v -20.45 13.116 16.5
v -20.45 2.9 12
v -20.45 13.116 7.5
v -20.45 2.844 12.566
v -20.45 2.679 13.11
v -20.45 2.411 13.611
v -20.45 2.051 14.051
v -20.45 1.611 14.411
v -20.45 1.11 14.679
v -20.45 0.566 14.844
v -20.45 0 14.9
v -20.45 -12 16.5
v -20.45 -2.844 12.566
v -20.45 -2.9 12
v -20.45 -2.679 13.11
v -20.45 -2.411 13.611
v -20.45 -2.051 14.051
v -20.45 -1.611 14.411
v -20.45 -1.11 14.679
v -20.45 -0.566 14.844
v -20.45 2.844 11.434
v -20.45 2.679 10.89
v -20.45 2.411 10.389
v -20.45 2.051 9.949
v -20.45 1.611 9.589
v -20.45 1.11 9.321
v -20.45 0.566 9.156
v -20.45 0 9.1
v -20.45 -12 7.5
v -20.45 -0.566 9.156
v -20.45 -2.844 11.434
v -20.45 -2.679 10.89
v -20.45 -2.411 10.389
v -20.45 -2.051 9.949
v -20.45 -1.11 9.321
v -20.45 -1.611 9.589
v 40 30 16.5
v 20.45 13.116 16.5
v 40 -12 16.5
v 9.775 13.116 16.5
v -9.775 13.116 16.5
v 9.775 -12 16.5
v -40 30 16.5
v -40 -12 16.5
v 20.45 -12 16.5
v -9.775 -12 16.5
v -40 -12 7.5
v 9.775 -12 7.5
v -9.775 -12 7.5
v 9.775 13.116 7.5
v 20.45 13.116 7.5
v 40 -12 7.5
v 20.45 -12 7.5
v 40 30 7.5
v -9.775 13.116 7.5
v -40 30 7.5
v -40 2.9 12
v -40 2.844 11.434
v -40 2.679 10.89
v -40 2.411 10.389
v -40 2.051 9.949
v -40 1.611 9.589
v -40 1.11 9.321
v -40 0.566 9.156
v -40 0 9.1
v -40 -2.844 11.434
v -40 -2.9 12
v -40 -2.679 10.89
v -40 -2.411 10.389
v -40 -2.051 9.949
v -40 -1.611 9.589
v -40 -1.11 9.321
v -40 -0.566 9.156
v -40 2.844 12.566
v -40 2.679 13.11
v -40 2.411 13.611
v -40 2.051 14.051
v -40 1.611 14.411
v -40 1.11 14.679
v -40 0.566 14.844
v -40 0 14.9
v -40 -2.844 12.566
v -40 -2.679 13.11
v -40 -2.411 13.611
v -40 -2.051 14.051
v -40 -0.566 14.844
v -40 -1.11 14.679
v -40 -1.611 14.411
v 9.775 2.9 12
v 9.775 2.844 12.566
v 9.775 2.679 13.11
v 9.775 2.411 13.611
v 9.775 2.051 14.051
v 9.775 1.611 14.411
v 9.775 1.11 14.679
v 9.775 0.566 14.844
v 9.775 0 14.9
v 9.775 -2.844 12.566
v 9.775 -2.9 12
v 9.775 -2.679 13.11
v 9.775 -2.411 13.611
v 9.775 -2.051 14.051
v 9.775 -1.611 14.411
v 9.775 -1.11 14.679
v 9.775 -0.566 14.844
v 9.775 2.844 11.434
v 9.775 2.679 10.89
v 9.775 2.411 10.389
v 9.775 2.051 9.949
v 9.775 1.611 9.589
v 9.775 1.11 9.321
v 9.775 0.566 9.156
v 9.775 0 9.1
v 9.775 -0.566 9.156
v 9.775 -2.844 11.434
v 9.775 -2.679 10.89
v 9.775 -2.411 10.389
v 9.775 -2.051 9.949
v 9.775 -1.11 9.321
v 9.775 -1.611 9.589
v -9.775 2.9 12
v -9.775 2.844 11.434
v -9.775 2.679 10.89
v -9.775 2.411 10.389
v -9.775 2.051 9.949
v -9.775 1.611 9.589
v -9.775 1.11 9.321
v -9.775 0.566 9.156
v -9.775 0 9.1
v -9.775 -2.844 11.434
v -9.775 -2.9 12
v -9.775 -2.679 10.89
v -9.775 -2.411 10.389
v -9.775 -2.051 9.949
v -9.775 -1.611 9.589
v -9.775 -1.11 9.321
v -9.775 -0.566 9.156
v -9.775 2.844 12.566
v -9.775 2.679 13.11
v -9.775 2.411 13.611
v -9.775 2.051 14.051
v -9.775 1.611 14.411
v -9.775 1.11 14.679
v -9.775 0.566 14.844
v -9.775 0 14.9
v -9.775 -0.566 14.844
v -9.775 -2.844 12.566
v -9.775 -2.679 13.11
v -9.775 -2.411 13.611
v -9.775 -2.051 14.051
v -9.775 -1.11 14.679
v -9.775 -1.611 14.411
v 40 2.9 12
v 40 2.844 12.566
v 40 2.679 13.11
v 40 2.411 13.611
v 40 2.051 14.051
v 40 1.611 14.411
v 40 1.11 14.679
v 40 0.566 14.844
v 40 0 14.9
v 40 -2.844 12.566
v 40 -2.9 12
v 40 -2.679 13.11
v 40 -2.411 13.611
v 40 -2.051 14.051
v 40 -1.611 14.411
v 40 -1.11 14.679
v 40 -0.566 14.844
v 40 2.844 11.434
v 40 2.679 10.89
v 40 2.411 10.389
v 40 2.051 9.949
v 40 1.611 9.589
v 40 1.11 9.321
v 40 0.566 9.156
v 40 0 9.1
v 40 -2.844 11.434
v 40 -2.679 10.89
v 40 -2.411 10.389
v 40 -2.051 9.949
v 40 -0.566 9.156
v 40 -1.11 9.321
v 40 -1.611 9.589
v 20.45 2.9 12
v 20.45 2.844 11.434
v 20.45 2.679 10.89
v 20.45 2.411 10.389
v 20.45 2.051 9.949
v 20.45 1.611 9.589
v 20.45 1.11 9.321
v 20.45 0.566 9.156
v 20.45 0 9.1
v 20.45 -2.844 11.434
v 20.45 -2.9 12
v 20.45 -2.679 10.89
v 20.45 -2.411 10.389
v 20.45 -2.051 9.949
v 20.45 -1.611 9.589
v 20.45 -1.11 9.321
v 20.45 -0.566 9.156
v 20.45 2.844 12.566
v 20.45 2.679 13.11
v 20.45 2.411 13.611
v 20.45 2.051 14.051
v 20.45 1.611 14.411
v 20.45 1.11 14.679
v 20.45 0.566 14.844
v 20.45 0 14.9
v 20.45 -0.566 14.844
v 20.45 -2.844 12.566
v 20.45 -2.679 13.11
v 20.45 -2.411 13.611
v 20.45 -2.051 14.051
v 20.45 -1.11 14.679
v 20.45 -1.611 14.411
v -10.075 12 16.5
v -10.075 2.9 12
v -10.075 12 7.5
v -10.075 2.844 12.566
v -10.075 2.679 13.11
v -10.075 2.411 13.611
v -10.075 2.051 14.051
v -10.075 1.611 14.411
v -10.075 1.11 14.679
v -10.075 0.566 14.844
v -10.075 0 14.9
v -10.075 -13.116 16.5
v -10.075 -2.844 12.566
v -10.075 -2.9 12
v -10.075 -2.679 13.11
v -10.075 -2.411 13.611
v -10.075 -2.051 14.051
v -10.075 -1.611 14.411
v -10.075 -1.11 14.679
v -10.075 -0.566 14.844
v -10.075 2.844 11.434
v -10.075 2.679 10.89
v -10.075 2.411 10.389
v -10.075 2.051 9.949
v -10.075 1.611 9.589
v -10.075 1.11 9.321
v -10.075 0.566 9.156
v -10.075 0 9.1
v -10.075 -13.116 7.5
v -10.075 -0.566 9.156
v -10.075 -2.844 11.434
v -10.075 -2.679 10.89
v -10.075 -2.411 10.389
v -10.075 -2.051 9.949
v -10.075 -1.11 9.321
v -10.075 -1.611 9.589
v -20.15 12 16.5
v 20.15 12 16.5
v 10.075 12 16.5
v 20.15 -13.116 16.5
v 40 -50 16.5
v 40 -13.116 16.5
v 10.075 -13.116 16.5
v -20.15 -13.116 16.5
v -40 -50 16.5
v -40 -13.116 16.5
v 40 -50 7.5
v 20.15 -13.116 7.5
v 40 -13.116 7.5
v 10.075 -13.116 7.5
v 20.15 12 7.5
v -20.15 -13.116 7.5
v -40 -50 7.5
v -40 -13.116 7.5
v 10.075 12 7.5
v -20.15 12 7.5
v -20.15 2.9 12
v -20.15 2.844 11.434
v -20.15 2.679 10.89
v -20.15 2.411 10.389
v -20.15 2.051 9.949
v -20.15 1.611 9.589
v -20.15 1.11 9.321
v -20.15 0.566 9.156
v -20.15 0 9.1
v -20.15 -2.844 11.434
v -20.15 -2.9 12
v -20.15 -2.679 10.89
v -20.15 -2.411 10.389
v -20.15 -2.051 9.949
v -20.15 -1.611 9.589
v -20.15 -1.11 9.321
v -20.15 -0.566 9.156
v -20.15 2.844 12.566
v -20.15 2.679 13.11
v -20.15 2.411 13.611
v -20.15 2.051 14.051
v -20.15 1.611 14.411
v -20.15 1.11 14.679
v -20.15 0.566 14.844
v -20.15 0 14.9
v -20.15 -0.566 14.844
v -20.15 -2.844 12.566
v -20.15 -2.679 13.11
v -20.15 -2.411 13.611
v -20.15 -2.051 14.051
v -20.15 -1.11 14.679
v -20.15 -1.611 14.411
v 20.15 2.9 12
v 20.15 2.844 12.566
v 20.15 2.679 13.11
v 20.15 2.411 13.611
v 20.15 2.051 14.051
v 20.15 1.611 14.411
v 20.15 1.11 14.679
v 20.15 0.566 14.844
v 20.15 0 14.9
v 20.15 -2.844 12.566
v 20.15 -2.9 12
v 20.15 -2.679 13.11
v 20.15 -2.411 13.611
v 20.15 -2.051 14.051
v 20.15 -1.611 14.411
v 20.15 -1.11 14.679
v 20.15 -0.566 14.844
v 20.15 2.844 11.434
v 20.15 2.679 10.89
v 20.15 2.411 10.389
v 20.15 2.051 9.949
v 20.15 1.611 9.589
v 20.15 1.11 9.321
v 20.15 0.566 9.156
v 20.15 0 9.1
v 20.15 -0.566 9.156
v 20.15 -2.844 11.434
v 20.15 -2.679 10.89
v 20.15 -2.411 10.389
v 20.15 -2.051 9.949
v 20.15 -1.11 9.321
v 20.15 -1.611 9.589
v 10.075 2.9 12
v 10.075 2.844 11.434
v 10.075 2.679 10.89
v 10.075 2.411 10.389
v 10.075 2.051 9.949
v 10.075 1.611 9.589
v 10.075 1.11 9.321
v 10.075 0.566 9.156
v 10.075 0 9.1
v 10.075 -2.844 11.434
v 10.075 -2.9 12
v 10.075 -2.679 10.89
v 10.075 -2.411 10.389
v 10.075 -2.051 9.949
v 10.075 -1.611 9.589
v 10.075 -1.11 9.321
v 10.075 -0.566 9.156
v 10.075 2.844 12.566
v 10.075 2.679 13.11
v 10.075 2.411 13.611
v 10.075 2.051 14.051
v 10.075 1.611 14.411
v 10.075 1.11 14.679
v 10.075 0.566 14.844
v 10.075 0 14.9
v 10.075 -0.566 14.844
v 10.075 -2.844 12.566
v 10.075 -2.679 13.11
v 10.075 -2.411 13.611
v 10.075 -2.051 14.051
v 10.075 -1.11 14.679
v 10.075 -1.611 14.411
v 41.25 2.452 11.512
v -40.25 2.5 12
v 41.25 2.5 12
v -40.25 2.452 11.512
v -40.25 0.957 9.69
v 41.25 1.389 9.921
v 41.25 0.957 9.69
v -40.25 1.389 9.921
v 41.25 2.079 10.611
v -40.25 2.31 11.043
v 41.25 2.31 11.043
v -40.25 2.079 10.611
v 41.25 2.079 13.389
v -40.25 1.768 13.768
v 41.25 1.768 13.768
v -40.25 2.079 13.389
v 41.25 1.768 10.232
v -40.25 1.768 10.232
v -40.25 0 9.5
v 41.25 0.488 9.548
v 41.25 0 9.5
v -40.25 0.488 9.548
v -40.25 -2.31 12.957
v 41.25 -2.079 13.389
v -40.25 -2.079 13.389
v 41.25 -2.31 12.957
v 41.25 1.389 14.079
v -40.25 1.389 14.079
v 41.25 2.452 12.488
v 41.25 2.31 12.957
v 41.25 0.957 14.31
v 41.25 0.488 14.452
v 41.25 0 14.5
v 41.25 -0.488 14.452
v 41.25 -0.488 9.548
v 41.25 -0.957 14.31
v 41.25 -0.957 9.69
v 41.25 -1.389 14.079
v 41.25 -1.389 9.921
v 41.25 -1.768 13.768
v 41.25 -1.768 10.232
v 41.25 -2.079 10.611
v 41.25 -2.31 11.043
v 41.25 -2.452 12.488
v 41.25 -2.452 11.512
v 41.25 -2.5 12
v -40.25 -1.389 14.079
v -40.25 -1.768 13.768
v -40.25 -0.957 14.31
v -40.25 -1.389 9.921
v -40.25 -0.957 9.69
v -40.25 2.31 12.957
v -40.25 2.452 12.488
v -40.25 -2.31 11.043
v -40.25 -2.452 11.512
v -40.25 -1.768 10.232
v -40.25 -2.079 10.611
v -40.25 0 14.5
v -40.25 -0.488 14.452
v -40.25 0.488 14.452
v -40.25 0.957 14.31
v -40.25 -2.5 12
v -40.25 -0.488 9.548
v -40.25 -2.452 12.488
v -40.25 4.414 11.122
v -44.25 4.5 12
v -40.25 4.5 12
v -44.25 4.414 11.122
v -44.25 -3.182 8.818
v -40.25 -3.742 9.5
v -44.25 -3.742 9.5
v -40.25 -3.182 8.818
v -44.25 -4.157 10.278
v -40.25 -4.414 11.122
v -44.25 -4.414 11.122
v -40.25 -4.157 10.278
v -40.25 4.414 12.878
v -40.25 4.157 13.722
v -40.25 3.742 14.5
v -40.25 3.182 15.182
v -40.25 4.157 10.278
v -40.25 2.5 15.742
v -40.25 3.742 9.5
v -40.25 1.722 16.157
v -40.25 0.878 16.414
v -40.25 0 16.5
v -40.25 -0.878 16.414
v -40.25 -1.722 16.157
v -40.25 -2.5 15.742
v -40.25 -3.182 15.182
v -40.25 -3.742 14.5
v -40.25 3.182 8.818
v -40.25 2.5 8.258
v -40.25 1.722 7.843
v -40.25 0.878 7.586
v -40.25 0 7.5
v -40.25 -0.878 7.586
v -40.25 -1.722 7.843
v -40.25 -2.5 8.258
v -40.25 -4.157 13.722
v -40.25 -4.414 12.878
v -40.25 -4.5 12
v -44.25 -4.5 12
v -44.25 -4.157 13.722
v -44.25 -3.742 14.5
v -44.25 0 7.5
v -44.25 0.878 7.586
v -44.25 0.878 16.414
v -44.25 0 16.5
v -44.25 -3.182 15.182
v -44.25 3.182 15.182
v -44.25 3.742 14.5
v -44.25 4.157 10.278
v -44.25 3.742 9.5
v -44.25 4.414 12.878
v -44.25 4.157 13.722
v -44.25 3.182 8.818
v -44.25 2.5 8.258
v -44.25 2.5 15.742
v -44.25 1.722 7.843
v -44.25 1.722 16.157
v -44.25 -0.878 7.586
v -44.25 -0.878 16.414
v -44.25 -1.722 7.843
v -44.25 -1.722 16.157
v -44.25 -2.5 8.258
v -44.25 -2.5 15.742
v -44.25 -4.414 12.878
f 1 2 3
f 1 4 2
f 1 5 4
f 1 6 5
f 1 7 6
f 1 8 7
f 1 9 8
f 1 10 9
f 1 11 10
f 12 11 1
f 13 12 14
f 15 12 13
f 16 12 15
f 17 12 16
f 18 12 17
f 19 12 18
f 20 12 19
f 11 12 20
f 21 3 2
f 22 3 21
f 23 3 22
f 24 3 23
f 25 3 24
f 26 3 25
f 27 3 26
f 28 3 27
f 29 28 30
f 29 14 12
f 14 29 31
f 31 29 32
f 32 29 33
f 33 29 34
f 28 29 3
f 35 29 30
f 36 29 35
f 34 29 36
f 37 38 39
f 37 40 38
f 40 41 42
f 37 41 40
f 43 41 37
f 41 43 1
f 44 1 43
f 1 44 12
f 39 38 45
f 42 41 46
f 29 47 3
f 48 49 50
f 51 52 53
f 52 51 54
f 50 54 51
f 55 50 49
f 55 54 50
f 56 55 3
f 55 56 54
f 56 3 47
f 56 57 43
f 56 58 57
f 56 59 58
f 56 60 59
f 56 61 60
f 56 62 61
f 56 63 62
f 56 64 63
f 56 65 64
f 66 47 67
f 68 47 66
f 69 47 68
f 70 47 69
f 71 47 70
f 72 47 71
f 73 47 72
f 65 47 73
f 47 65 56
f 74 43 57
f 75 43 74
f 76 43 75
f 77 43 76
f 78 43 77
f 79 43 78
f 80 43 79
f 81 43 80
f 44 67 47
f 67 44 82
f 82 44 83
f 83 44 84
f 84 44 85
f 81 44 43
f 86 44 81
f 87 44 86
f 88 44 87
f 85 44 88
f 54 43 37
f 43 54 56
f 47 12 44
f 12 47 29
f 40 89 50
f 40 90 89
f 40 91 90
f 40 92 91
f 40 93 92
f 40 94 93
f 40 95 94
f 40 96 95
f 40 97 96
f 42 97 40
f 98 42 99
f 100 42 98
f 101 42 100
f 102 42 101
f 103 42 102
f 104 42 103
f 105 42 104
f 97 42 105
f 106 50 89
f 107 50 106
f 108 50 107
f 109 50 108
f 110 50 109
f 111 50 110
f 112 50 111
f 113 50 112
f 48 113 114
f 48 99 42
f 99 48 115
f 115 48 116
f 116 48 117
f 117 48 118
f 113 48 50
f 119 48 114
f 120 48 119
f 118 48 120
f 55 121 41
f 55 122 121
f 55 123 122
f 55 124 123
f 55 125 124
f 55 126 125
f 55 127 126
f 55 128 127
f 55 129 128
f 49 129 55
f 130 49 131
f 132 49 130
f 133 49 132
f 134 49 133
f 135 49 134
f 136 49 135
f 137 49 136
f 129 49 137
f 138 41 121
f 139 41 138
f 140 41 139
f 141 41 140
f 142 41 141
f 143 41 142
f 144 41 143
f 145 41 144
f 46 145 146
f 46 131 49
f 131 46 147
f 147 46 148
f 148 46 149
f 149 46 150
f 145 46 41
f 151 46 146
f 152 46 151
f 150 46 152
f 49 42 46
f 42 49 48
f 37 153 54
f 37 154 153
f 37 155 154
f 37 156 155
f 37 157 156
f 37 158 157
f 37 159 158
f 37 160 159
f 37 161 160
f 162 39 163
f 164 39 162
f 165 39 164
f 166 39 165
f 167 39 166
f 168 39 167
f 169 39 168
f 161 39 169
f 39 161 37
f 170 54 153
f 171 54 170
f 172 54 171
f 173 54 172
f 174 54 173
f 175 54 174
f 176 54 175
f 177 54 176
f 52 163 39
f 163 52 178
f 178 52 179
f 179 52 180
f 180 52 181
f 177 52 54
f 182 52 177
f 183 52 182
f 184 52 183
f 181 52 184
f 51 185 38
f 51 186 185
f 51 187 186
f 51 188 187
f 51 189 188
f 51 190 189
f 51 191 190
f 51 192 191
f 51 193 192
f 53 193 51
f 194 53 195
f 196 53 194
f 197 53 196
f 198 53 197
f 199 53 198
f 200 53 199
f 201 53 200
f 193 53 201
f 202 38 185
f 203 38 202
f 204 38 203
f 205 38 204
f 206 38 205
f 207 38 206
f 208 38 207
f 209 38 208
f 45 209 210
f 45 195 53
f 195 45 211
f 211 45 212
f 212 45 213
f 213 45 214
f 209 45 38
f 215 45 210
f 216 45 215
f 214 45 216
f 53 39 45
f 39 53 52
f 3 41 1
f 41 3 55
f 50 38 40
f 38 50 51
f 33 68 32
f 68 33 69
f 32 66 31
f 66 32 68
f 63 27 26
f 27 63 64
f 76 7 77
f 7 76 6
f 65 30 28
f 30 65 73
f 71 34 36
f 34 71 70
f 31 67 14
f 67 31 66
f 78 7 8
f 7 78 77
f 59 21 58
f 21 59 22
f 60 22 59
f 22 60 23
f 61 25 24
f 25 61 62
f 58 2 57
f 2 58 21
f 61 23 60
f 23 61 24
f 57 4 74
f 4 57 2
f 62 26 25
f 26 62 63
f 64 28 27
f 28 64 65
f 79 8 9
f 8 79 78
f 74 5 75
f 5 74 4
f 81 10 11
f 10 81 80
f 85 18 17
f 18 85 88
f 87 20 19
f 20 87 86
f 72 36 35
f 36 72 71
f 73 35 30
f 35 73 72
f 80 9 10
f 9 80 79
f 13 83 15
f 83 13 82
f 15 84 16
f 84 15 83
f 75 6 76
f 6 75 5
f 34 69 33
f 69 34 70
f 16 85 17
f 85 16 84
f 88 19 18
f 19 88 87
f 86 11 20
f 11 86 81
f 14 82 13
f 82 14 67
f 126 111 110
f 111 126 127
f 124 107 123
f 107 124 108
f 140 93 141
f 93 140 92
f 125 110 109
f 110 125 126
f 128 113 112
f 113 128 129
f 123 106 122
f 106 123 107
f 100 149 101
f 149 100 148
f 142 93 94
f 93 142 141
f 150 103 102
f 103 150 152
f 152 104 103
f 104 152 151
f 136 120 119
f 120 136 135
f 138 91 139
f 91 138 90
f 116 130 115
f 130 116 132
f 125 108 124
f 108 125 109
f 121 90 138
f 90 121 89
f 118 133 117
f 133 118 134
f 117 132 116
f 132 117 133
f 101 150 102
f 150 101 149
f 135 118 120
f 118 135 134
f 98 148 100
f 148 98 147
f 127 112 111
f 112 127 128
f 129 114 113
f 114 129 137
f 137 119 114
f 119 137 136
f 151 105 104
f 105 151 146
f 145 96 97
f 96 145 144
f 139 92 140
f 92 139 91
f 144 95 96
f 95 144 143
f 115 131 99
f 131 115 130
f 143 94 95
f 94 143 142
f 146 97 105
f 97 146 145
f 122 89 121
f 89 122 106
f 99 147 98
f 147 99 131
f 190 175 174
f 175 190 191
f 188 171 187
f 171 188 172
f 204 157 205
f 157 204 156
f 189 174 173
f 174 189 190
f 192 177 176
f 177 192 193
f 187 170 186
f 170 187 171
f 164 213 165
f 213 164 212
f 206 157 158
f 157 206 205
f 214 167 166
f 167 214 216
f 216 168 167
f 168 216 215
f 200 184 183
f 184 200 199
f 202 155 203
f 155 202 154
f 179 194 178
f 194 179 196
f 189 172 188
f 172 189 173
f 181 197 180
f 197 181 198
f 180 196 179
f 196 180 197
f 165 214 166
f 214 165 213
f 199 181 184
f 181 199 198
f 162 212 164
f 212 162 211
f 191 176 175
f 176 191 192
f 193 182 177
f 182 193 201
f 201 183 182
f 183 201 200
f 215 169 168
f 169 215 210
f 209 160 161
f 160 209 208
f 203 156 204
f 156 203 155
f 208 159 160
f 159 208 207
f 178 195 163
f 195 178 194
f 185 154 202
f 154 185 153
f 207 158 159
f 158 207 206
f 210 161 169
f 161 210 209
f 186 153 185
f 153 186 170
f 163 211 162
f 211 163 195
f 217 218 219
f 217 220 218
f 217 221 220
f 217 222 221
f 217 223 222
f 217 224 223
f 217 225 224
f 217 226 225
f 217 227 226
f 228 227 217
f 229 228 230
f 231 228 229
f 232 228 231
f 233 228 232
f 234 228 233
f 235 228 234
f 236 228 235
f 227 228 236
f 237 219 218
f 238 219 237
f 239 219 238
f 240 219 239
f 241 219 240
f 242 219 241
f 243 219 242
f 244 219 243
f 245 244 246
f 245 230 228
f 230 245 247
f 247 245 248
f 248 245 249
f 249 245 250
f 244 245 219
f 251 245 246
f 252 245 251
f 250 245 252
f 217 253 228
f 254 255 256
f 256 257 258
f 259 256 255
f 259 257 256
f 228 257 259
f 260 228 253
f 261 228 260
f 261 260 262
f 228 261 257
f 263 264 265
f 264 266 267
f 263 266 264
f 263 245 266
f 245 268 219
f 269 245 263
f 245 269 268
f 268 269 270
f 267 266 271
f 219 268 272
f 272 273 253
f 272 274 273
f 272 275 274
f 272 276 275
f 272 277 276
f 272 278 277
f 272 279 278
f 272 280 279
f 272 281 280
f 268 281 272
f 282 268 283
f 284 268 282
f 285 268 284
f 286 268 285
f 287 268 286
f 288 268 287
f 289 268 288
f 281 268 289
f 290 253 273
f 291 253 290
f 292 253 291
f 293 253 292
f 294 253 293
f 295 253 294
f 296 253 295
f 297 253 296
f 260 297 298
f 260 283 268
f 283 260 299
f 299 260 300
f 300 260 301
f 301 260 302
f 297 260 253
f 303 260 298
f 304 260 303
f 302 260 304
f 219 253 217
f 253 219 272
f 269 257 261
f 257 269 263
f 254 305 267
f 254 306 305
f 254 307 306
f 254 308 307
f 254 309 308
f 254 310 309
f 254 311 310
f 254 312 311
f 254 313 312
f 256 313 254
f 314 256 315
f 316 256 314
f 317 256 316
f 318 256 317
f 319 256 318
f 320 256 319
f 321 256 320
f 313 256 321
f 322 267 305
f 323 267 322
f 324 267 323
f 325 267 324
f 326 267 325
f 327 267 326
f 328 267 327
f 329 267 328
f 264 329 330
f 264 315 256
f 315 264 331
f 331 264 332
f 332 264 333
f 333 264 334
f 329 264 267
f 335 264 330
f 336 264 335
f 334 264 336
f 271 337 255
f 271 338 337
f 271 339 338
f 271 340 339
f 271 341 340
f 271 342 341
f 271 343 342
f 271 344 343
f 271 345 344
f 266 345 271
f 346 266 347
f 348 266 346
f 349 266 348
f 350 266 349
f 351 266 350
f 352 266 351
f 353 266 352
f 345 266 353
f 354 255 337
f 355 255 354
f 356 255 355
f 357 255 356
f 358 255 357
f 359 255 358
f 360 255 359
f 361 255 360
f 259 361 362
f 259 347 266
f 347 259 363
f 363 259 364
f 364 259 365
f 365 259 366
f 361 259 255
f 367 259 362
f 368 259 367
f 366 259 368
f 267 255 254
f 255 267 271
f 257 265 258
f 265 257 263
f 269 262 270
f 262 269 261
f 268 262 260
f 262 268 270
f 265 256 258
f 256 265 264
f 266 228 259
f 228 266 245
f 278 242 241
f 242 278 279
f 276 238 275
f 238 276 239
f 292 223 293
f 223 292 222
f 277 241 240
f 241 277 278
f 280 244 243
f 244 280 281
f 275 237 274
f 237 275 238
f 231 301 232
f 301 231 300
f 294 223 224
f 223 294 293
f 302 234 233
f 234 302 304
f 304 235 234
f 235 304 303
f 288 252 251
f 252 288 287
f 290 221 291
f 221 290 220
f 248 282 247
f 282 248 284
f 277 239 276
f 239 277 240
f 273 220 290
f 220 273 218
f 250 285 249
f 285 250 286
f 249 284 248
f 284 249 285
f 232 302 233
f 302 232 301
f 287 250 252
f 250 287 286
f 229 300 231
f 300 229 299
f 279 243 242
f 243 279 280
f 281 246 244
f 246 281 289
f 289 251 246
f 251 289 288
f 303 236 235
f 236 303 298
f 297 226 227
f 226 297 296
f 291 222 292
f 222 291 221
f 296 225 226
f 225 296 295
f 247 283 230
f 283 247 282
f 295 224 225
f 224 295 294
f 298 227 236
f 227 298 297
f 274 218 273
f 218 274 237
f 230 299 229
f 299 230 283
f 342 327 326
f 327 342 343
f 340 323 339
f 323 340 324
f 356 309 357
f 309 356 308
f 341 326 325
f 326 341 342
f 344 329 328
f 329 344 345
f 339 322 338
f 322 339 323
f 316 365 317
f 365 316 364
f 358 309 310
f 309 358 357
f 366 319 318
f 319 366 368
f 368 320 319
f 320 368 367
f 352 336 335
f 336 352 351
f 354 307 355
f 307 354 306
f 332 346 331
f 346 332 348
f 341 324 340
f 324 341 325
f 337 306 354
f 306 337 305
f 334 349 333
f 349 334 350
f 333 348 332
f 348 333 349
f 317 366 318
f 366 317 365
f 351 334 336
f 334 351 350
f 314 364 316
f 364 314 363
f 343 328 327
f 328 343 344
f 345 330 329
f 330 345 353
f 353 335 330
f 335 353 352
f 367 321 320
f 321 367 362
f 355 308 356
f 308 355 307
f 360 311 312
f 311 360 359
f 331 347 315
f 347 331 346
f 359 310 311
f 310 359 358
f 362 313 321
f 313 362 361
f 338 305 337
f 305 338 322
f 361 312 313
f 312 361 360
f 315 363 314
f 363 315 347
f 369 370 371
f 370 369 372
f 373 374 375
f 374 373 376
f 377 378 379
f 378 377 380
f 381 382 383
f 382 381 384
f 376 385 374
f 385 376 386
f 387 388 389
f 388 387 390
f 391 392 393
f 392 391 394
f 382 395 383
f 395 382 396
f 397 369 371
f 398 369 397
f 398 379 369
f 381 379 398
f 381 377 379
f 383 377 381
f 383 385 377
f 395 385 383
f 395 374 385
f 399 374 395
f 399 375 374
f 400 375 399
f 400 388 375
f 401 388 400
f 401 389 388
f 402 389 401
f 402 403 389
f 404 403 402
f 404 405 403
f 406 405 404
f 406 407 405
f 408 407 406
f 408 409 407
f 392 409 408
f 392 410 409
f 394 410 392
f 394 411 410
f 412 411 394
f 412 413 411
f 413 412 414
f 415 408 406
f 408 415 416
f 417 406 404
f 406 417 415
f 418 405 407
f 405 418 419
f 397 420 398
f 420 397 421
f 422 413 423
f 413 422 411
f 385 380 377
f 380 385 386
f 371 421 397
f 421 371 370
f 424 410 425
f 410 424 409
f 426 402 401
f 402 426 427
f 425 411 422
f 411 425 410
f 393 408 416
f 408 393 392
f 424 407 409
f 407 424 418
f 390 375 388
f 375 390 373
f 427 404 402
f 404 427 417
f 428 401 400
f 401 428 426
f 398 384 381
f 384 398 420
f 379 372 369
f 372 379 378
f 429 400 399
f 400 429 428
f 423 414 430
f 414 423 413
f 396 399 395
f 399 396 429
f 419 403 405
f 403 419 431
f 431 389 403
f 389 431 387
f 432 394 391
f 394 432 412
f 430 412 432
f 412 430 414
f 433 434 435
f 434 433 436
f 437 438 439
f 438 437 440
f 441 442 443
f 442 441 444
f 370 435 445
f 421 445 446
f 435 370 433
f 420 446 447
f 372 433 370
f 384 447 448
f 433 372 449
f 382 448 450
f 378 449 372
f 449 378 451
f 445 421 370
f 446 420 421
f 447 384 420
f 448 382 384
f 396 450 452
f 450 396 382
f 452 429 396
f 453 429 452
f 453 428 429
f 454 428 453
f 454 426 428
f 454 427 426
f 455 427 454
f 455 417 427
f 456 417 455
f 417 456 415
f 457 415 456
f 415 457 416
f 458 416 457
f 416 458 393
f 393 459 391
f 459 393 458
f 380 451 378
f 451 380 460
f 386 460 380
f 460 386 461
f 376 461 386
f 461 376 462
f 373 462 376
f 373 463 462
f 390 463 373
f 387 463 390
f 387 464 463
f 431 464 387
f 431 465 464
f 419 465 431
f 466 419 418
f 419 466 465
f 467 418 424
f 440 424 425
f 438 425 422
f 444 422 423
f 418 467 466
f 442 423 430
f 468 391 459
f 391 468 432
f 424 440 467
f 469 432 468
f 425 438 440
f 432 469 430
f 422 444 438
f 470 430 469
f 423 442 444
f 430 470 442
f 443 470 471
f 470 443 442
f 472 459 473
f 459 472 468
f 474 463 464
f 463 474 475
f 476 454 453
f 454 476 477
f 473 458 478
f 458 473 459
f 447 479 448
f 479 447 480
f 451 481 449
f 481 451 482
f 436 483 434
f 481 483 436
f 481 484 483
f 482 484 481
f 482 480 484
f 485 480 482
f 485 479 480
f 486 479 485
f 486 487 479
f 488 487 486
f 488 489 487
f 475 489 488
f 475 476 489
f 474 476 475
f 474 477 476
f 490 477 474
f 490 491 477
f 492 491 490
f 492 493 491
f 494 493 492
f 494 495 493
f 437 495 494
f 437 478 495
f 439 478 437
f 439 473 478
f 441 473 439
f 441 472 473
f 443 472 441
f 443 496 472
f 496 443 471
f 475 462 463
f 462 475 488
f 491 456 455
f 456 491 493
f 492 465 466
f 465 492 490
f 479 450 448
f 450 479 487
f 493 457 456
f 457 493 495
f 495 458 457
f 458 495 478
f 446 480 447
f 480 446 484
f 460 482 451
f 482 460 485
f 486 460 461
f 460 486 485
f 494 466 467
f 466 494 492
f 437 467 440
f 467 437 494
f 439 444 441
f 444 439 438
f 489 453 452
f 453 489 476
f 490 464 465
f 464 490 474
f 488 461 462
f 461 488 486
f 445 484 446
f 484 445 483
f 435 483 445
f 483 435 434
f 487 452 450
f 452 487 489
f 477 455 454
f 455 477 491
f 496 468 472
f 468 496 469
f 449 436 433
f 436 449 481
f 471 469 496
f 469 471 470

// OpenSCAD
$fn = 32;

// ------------------------------------------------------------------------
// Butt hinge: hinge 80 mm, leaf swung 0 deg
// Every part is its own module, assembly() places every instance.
// ------------------------------------------------------------------------

// --- part 1 ---
module hinge_base() {
  difference() {
    union() {
      translate([-40, -12, -4.5]) cube([19.55, 42, 9]);
      translate([-9.775, -12, -4.5]) cube([19.55, 42, 9]);
      translate([20.45, -12, -4.5]) cube([19.55, 42, 9]);
      translate([-40, 13.116, -4.5]) cube([80, 16.884, 9]);
    }
    translate([-30.225, 0, 0]) rotate([0, 90, 0]) cylinder(h = 21.55, d = 5.8, center = true);
    translate([0, 0, 0]) rotate([0, 90, 0]) cylinder(h = 21.55, d = 5.8, center = true);
    translate([30.225, 0, 0]) rotate([0, 90, 0]) cylinder(h = 21.55, d = 5.8, center = true);
  }
}

// --- part 2 ---
module hinge_mover() {
  difference() {
    union() {
      translate([-20.15, -50, -4.5]) cube([10.075, 62, 9]);
      translate([10.075, -50, -4.5]) cube([10.075, 62, 9]);
      translate([-40, -50, -4.5]) cube([80, 36.884, 9]);
    }
    translate([-15.113, 0, 0]) rotate([0, 90, 0]) cylinder(h = 12.075, d = 5.8, center = true);
    translate([15.113, 0, 0]) rotate([0, 90, 0]) cylinder(h = 12.075, d = 5.8, center = true);
  }
}

// --- part 3 ---
module hinge_pin() {
  rotate([0, 90, 0]) cylinder(h = 82.5, d = 5, center = true);
  translate([-44.25, 0, 0]) rotate([0, 90, 0]) cylinder(h = 4, d = 9);
}

// --- assembly ---
module assembly() {
  color([0.80, 0.24, 0.20]) translate([0, 0, 12]) rotate([0, 0, 0]) hinge_base();
  color([0.20, 0.45, 0.75]) translate([0, 0, 12]) rotate([0, 0, 0]) hinge_mover();
  color([0.25, 0.62, 0.32]) translate([0, 0, 12]) rotate([0, 0, 0]) hinge_pin();
}

assembly();
